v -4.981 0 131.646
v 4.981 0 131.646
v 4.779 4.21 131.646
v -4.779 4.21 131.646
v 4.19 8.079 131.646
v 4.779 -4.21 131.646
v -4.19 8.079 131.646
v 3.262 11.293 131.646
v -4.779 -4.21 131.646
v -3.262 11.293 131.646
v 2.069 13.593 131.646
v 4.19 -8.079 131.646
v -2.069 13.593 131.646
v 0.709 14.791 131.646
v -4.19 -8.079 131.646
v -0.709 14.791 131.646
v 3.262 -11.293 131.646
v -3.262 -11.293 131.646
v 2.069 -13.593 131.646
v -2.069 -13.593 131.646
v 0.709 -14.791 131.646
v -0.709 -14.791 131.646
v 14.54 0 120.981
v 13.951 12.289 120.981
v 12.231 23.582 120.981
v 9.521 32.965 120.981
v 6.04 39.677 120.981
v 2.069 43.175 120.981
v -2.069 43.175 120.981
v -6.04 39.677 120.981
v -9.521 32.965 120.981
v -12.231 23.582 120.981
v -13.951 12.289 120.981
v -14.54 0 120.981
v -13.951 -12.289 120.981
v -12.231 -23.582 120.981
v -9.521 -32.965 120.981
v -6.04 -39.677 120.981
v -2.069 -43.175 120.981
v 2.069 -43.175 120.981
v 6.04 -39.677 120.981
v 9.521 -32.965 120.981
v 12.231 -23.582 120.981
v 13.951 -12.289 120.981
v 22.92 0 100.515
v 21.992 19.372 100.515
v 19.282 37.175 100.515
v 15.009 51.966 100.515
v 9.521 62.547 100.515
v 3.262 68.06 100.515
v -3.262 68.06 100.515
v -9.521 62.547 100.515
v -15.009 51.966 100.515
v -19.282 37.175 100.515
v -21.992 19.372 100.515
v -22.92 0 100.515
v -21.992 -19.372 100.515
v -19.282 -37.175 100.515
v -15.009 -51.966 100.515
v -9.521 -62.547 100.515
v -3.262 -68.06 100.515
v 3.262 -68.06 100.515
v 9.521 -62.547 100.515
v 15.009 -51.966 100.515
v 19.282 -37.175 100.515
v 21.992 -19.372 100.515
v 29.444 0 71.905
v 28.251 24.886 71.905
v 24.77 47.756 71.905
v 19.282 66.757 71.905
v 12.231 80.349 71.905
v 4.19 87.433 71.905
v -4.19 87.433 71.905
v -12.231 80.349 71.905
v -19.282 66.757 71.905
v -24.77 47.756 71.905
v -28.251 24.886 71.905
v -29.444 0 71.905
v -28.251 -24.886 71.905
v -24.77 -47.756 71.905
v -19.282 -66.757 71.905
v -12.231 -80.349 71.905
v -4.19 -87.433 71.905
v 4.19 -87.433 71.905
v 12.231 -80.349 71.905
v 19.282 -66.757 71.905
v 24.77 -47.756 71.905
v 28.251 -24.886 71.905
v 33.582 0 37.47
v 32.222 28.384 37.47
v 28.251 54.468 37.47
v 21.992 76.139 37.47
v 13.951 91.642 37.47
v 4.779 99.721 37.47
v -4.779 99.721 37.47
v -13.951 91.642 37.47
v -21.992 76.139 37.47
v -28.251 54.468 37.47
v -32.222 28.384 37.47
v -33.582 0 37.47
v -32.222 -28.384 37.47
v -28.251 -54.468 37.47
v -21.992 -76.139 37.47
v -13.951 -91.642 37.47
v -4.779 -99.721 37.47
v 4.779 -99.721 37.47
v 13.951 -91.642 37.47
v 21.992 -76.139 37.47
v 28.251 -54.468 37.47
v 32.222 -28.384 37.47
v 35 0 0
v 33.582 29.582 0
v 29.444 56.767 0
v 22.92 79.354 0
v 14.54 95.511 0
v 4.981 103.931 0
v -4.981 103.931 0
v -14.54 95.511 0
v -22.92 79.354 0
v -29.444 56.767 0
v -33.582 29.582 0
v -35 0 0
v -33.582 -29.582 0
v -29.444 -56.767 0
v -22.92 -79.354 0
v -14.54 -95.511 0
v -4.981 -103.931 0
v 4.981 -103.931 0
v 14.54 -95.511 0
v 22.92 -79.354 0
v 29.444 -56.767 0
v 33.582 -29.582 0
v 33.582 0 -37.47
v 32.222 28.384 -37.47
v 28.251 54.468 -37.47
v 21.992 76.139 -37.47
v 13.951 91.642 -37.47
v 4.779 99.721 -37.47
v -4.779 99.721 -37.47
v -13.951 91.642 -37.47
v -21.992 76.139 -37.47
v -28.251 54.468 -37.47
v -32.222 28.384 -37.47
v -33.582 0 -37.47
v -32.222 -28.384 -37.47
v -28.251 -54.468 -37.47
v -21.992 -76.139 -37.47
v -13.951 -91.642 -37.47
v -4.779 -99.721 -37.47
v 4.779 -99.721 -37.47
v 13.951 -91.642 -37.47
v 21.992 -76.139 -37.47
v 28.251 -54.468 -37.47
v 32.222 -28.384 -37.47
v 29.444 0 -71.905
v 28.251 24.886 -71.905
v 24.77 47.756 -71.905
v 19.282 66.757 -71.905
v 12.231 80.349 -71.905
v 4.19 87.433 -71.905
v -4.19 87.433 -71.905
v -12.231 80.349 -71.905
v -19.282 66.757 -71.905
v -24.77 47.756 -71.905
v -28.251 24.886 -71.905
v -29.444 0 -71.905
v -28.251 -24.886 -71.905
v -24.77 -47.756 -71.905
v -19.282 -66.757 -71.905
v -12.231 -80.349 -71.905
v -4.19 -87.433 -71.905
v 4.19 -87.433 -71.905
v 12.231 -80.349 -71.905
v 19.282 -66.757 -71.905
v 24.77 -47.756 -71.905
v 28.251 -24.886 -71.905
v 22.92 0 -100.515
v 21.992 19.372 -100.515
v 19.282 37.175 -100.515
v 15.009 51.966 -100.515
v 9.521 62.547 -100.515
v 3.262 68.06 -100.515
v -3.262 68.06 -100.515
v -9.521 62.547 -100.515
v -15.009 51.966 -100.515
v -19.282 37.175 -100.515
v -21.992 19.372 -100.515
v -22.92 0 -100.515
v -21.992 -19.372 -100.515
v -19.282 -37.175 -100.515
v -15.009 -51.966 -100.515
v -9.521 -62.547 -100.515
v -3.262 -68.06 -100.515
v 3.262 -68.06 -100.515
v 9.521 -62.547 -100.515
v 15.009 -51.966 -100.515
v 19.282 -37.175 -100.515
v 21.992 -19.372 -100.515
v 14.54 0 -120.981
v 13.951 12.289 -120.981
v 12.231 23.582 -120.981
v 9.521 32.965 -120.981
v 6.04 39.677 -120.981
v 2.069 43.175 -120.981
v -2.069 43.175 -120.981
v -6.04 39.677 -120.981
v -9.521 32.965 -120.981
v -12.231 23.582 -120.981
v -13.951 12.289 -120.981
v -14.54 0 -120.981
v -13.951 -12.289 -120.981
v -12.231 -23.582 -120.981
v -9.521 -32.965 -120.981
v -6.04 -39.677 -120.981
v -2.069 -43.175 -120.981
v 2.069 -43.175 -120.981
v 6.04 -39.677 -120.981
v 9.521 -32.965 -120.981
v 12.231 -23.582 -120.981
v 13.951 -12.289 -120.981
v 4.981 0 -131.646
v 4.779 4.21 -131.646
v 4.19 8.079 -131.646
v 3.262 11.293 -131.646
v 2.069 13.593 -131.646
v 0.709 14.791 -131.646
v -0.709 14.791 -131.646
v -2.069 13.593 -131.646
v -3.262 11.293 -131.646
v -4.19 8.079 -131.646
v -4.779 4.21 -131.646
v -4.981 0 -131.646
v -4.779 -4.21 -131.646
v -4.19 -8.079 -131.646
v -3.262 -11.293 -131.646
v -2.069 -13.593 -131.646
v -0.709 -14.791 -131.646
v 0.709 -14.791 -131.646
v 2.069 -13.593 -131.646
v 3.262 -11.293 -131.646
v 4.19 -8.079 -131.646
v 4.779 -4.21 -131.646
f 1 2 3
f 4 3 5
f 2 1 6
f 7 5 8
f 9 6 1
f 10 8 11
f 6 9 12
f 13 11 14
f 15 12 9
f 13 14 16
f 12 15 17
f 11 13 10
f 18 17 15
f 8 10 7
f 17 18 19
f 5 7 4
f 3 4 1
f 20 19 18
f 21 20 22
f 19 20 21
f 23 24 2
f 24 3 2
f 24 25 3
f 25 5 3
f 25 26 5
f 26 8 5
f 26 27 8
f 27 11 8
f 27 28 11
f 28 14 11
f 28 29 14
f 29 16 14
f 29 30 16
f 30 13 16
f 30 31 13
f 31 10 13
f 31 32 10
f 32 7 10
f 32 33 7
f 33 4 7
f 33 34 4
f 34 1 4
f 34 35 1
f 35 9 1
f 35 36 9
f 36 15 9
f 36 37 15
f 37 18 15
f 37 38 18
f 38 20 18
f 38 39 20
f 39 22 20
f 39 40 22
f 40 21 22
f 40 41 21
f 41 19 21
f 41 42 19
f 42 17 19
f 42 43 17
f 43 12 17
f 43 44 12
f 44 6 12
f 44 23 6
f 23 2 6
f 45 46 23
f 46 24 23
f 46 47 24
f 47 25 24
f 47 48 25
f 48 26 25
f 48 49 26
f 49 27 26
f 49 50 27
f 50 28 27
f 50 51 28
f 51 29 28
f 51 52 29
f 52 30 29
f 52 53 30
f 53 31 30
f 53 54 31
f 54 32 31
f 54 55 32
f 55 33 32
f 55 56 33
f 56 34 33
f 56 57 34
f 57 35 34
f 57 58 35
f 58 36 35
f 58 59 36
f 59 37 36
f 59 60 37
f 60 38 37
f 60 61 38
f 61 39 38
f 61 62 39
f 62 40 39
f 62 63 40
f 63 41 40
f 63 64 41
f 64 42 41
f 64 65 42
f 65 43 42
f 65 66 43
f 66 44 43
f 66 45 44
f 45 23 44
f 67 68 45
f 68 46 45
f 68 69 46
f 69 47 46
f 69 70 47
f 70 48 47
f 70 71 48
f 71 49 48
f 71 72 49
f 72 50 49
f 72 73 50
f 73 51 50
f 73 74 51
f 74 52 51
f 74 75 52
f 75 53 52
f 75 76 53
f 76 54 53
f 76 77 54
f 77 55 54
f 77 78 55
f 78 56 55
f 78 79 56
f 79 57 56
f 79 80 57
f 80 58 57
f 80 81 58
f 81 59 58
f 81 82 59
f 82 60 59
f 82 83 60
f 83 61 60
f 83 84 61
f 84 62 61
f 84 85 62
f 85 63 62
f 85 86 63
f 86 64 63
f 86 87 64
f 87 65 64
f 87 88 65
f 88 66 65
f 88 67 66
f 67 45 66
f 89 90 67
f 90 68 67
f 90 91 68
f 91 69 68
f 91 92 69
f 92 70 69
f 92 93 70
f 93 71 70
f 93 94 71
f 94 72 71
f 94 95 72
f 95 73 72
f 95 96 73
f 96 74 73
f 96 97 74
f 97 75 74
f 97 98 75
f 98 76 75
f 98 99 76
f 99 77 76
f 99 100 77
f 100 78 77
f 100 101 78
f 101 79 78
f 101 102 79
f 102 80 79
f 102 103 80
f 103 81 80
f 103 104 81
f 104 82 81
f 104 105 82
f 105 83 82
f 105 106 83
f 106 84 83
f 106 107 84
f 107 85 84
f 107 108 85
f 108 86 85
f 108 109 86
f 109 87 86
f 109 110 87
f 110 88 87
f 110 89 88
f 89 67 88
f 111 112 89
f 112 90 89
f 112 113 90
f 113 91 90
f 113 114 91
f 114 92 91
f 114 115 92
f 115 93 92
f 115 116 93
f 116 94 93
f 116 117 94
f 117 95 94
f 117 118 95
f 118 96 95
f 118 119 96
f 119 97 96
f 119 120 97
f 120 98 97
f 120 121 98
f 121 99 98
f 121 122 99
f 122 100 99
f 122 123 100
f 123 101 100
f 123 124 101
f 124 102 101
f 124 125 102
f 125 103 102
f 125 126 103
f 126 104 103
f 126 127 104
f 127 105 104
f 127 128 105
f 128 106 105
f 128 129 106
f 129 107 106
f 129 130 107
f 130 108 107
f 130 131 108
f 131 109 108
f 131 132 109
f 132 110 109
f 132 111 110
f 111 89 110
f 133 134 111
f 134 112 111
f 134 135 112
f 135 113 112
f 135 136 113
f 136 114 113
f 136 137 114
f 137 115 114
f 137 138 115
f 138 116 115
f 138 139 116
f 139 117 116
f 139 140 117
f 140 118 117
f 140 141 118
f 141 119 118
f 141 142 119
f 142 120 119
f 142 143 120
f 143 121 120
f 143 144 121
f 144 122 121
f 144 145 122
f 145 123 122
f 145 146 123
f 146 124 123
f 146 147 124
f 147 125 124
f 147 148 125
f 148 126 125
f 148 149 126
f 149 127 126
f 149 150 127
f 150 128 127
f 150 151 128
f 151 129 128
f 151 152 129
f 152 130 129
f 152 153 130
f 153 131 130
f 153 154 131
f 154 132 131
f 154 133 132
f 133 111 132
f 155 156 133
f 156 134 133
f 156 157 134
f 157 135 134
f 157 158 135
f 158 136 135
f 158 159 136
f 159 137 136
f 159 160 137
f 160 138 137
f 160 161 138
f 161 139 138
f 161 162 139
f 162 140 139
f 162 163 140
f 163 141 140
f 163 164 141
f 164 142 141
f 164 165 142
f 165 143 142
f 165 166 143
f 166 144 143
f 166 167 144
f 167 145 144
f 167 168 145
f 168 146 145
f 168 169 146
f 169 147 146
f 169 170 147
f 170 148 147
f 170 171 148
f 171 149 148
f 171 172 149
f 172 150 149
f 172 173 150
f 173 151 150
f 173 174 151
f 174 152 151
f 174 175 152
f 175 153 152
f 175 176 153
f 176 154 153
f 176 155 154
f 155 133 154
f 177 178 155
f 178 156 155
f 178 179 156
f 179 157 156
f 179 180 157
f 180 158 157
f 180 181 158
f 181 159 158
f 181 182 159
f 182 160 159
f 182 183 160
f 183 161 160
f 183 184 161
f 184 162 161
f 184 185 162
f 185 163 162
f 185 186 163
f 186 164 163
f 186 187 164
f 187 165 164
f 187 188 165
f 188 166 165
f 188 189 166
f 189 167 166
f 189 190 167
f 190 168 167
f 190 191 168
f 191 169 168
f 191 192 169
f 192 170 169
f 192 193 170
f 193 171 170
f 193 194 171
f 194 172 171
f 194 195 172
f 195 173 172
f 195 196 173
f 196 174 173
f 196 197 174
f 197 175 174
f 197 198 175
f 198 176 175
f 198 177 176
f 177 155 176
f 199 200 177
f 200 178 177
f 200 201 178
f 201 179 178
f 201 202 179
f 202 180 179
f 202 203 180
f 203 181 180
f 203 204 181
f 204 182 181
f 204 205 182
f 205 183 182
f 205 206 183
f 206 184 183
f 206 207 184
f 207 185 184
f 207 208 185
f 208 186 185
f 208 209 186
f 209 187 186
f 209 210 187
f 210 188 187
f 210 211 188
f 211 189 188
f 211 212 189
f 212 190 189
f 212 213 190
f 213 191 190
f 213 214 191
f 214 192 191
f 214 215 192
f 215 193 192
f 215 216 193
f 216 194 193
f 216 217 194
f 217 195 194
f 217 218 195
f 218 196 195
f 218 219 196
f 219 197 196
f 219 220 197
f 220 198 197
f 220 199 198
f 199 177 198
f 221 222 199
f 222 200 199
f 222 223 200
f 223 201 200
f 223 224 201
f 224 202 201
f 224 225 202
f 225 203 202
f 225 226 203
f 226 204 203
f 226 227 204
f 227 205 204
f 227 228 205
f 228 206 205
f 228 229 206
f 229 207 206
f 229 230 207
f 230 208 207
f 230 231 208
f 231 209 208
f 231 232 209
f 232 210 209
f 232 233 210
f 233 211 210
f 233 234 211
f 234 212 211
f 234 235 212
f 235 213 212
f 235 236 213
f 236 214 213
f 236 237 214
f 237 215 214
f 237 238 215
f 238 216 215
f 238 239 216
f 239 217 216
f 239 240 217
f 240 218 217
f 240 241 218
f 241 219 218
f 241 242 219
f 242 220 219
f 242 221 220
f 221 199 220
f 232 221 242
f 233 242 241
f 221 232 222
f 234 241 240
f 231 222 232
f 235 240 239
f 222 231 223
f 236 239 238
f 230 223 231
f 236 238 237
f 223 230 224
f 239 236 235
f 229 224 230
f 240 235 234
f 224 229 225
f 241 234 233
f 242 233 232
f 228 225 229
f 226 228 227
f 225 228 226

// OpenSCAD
// Generated by SolidPython 1.0.1 on 2020-07-29 00:46:46


scale(v = [5, 15, 19]) {
	sphere(r = 7);
}
/***********************************************
*********      SolidPython code:      **********
************************************************
 
# import packages: SolidPython
from solid import *
from solid.utils import *
from itertools import chain, combinations, permutations


class Resize:

    def __init__(self, scad_file):
        self.scad_file = scad_file
        #self.scad_file = import_scad(scad_file)
        # cone/cylinder param:
        self.r1 = 0
        self.r2 = 0
        self.h = 0
        # rectangular prism param:
        self.w = 0
        self.l = 0
        # ellipse param:
        self.r = 0

    # import OpenScad code (file name corresponds to shape)


    # classify shape + parameters
    def assign(self, param1, param2, param3):
        if self.scad_file == 'cone.scad':
            self.r1 = param1
            self.r2 = param2
            self.h = param3
        elif self.scad_file == 'cylinder.scad':
            self.r1 = param1
            self.r2 = param2
            self.h = param3
        elif self.scad_file == 'rectangularPrism.scad':
            self.h = param1
            self.l = param2
            self.w = param3
        else:
            self.r = param1
            self.h = param2

    # resize parameters
    def iterate(self):
        x = range(3, 20, 2)
        i = 1
        if self.scad_file == 'cone.scad':
            tempList = list(permutations(x, 2))
            for temp in tempList:
                param1 = temp[0]
                param2 = temp[1]
                filepath = 'produced_scad_files/' + 'cone' + str(param1) + '_' + str(param2) + '_' + '.scad'
                scad_render_to_file(cylinder(h=param1, r1=param2, r2=0), filepath)

        elif self.scad_file == 'cylinder.scad':
            tempList = list(permutations(x, 3))
            for temp in tempList:
                param1 = temp[0]
                param2 = temp[1]
                filepath = 'produced_scad_files/' + 'cylinder' + str(param1) + '_' + str(param2) + '_' + '.scad'
                scad_render_to_file(cylinder(h=param1, r1=param2, r2=param2), filepath)

        elif self.scad_file == 'rectangularPrism.scad':
            tempList = list(permutations(x, 3))
            for temp in tempList:
                param1 = temp[0]
                param2 = temp[1]
                param3 = temp[2]
                filepath = 'produced_scad_files/' + 'rectangularPrism' + str(param1) + '_' + str(param2) + '_' + str(
                    param3) + '.scad'
                scad_render_to_file(cube(size=(param1, param2, param3)), filepath)

        elif self.scad_file == 'ellipse.scad':
            tempList = list(permutations(x, 4))
            for temp in tempList:
                param1 = temp[0]
                param2 = temp[1]
                param3 = temp[2]
                param4 = temp[3]
                filepath = 'produced_scad_files/' + 'ellipse' + str(param1) + '_' + str(param2) + '_' + str(param3) + '_' + str(param4) + '.scad'
                scad_render_to_file(scale([param1, param2, param3])(sphere(r=param4)), filepath)

    def render_to_scadfile(self):
        scad_render_to_file(scad, 'example.scad') 
 
************************************************/
